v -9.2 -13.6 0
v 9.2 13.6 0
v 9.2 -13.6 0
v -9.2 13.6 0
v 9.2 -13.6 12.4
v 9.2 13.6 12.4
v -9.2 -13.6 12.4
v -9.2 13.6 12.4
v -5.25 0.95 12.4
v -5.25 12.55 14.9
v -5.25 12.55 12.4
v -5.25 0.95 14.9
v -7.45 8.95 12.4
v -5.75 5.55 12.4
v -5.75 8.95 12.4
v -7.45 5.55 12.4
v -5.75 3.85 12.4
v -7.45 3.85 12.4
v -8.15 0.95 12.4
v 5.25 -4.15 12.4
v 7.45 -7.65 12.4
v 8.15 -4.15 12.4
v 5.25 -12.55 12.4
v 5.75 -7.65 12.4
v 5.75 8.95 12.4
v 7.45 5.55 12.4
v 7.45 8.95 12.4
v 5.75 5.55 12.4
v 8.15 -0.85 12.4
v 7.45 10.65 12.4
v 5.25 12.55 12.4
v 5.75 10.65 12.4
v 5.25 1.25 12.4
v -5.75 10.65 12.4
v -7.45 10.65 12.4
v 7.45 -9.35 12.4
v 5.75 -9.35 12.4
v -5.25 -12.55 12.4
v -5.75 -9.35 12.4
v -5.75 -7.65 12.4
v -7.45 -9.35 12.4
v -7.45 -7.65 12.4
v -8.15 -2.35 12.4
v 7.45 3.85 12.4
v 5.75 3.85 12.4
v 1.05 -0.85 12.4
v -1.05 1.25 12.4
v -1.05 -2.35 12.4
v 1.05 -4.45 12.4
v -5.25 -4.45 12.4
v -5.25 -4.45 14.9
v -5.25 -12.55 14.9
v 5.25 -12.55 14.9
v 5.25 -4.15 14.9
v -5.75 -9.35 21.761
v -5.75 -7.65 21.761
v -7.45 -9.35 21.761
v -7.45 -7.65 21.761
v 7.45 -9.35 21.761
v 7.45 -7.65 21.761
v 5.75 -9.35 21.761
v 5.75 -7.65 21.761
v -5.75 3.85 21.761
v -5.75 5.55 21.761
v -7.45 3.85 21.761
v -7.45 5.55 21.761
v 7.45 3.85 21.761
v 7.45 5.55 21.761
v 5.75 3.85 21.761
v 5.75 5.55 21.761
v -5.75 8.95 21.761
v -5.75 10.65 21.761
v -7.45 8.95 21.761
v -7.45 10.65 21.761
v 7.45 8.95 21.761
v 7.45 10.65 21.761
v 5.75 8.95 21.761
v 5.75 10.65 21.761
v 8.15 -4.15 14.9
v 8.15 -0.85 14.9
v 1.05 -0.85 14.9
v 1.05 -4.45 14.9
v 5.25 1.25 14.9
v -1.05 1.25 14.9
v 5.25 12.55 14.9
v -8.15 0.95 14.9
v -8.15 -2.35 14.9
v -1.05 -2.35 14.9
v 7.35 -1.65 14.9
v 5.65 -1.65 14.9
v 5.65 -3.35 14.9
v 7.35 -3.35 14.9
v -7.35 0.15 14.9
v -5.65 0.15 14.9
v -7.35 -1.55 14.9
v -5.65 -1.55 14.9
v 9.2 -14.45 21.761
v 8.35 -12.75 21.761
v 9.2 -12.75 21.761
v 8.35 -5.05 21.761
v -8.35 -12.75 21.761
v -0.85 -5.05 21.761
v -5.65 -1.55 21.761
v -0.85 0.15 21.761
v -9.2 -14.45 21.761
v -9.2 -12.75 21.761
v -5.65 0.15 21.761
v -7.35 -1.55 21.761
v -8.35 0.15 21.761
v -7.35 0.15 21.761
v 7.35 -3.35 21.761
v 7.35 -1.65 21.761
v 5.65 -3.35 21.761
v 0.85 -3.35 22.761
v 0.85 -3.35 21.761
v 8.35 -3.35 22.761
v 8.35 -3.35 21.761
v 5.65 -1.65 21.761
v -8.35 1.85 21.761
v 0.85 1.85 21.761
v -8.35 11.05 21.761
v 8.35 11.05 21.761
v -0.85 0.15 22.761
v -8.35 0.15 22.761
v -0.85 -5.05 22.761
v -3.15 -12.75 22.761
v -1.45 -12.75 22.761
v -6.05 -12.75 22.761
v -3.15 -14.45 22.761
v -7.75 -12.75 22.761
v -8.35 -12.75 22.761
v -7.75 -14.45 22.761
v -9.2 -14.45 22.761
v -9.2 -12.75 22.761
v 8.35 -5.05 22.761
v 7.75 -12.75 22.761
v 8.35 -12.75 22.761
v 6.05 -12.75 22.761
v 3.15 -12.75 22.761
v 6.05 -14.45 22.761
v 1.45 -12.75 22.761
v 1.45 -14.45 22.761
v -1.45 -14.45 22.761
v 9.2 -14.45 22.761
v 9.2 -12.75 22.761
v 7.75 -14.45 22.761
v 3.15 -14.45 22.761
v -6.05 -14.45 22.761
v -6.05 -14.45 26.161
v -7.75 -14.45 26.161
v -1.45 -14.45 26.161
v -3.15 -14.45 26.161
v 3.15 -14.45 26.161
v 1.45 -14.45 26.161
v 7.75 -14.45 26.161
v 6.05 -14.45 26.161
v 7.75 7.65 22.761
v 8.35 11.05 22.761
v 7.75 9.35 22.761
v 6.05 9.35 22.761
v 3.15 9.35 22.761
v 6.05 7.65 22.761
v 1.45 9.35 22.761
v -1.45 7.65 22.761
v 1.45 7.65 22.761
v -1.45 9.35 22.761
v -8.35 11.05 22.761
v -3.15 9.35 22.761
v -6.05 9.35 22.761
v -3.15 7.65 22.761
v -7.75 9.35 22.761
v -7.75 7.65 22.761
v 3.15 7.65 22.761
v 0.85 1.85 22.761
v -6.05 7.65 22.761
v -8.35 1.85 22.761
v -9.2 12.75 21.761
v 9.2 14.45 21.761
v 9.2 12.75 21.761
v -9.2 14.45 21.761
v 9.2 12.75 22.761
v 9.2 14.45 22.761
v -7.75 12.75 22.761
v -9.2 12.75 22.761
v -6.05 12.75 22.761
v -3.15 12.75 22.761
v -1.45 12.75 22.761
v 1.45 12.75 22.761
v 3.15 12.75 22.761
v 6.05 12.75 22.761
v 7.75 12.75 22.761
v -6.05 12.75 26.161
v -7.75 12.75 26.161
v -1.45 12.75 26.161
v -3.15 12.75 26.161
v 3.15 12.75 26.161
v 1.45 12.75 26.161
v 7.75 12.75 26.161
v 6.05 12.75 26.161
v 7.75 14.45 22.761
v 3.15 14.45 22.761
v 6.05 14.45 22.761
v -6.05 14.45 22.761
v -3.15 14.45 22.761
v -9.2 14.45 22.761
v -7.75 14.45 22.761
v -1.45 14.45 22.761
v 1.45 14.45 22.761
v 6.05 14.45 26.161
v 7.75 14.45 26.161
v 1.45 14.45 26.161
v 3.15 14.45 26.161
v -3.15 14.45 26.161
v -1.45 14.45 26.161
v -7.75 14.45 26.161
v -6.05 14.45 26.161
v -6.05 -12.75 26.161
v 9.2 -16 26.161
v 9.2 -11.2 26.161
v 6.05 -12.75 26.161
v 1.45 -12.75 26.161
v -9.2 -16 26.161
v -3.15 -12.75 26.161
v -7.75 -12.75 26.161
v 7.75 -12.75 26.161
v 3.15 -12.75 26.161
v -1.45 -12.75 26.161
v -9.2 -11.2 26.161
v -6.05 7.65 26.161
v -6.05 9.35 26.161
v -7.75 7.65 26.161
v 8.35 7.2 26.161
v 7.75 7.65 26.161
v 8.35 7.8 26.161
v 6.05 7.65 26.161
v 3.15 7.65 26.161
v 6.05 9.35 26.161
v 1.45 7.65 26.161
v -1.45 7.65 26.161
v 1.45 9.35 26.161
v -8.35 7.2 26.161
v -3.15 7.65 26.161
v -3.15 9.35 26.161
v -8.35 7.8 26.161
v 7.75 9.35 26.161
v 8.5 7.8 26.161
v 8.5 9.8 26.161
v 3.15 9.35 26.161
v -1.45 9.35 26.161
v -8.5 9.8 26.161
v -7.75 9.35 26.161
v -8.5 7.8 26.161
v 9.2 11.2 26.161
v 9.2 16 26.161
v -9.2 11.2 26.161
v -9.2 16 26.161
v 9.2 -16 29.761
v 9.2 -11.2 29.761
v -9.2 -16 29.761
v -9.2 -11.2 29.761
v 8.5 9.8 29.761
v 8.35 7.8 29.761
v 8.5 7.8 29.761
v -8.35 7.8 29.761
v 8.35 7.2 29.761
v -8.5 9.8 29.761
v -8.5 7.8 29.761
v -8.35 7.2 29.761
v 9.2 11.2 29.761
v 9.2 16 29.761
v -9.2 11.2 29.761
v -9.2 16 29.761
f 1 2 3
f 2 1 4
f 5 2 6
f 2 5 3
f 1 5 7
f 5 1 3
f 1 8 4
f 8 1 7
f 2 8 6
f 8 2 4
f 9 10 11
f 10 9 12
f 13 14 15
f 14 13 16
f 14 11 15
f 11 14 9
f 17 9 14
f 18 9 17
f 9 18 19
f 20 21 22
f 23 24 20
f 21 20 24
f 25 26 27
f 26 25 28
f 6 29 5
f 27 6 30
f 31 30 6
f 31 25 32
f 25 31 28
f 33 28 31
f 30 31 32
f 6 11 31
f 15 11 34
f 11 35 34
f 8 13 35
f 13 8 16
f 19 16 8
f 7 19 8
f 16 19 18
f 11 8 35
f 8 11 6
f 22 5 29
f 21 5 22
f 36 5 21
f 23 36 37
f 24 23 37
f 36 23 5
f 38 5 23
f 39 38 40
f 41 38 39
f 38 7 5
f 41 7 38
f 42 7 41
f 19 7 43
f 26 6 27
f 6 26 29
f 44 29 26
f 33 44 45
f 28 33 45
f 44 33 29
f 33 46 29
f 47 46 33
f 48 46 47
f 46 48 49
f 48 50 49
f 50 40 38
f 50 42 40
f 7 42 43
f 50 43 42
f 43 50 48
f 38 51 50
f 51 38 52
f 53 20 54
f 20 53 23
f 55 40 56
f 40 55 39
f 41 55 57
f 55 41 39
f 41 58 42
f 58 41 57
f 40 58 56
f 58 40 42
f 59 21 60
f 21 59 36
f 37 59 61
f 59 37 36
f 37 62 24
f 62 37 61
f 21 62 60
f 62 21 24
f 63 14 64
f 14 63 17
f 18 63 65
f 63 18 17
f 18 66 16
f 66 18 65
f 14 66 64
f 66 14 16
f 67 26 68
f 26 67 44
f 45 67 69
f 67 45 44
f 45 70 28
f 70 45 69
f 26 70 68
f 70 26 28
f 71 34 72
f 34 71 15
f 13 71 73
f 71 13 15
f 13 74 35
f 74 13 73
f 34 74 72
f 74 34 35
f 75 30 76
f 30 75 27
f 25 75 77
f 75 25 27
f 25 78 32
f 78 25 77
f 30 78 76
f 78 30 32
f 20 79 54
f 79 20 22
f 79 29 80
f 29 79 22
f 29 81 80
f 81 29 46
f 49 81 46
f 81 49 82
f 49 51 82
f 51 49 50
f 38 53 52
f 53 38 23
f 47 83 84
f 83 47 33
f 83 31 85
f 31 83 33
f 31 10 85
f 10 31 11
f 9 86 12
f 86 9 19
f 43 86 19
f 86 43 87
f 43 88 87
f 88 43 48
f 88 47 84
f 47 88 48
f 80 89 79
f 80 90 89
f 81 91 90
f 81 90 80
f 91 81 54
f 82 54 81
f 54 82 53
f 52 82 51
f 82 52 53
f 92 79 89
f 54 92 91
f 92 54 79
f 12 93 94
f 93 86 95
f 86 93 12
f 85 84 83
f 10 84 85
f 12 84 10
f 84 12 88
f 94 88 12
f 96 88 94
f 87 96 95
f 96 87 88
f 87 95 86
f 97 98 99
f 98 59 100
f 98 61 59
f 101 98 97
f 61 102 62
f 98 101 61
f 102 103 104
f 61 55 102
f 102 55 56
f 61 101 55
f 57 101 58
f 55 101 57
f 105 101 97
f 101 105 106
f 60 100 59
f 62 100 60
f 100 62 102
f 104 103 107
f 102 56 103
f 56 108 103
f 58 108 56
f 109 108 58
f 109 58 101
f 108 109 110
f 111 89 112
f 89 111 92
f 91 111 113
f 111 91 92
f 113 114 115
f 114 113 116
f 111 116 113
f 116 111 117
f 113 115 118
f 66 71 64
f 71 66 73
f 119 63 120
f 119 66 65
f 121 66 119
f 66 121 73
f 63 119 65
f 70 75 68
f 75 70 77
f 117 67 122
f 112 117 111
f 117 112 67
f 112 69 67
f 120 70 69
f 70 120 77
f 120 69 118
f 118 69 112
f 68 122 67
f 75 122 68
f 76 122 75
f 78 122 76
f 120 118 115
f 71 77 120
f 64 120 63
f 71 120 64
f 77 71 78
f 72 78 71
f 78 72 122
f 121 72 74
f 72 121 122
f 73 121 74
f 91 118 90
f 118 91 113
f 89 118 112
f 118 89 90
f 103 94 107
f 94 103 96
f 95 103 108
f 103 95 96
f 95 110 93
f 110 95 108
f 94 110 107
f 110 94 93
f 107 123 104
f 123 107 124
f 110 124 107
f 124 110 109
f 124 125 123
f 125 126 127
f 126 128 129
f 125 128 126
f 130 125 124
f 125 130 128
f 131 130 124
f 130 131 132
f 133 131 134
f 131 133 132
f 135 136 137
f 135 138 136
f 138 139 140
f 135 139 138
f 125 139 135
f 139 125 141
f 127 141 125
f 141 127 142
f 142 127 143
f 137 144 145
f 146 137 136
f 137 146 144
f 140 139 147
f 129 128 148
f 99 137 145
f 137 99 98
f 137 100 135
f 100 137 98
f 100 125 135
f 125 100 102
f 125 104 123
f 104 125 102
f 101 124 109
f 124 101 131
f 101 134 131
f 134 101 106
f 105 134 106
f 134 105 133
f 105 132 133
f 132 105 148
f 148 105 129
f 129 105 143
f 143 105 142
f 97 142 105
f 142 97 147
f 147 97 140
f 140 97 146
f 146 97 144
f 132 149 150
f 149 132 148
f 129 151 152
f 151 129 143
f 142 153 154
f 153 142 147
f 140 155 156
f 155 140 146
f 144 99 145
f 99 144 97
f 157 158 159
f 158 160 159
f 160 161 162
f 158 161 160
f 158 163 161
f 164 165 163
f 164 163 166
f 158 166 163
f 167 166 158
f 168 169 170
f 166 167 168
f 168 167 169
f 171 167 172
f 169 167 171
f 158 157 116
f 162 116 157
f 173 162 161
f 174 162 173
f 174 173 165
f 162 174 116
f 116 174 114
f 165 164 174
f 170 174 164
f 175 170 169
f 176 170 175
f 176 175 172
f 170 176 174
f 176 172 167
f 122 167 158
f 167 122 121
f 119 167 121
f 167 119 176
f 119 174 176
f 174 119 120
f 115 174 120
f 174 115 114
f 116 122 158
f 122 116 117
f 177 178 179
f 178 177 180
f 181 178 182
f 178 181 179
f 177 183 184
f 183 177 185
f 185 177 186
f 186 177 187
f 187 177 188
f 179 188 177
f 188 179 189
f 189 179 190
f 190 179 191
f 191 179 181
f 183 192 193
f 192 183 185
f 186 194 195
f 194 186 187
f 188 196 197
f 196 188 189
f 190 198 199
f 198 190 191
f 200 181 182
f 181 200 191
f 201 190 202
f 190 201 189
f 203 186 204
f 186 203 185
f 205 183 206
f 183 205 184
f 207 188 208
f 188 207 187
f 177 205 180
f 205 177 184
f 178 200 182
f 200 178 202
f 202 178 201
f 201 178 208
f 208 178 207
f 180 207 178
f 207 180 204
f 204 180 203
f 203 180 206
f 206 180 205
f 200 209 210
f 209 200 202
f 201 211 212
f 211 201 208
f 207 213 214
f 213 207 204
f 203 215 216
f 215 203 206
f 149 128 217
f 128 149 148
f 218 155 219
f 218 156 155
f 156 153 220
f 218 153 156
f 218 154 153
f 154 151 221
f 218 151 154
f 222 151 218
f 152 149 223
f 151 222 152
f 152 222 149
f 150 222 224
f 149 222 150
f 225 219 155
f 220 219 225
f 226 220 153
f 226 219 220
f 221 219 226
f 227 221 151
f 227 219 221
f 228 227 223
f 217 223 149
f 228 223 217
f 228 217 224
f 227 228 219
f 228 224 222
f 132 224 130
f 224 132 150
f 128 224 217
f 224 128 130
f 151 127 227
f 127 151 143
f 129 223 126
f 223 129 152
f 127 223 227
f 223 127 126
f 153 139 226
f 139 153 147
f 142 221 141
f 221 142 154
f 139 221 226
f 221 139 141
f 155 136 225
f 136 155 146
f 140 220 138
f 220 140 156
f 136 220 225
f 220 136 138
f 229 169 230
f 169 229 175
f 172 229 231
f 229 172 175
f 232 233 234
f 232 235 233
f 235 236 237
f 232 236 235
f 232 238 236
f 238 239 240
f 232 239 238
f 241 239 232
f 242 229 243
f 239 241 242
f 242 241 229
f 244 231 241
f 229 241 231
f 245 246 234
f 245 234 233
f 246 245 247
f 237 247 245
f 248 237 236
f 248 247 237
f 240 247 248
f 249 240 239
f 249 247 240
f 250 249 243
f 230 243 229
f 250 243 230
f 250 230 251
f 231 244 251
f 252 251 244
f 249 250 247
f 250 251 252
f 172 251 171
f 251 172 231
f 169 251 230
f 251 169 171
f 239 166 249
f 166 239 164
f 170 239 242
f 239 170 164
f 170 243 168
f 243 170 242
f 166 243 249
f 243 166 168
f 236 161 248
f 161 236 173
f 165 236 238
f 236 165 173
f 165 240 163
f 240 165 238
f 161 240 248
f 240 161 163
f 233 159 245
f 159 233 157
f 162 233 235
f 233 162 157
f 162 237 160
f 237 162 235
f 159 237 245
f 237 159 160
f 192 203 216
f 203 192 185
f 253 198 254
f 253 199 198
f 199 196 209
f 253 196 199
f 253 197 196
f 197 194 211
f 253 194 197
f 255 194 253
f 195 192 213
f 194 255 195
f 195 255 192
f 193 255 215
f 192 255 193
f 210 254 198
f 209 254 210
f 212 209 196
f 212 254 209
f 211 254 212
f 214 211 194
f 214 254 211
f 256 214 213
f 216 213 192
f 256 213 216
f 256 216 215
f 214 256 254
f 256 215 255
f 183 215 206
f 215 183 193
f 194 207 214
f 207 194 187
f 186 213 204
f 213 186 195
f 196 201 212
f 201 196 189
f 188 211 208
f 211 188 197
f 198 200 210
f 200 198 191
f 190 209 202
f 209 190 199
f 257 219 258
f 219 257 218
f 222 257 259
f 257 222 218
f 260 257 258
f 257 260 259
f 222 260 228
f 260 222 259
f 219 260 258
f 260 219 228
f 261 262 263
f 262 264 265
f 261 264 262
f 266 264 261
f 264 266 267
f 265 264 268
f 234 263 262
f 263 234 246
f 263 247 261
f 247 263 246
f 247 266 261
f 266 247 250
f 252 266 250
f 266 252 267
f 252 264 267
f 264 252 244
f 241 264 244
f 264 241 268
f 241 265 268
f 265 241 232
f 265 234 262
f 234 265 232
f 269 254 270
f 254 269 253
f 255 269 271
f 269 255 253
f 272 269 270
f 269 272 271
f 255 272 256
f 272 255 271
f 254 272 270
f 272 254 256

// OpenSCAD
// Generated by SolidPython 0.4.2 on 2020-09-29 23:21:05
//!OpenSCAD

scale(v = 0.0100000000) {
	translate(v = [-920, -1360, 0]) {
		union() {
			color(c = [0.4000000000, 0.4000000000, 0.4000000000]) {
				translate(v = [0, 0, 0]) {
					linear_extrude(height = 1000.0000000000) {
						polygon(paths = [[0, 1, 2, 3]], points = [[0, 0], [0, 2720], [1840, 2720], [1840, 0]]);
					}
				}
			}
			color(c = [0.2000000000, 0.6000000000, 0.2000000000]) {
				translate(v = [0, 0, 1000.0000000000]) {
					linear_extrude(height = 120.0000000000) {
						polygon(paths = [[0, 1, 2, 3]], points = [[0, 1305], [0, 2720], [1840, 2720], [1840, 1305]]);
					}
				}
			}
			color(c = [0.4000000000, 0.4000000000, 0.4000000000]) {
				translate(v = [0, 0, 1000.0000000000]) {
					linear_extrude(height = 120.0000000000) {
						polygon(paths = [[0, 1, 2, 3]], points = [[0, 0], [0, 1305], [1840, 1305], [1840, 0]]);
					}
				}
			}
			color(c = [0.9000000000, 0.6000000000, 0.6000000000]) {
				translate(v = [0, 0, 1120.0000000000]) {
					linear_extrude(height = 120.0000000000) {
						polygon(paths = [[0, 1, 2, 3]], points = [[135, 1615], [135, 2485], [395, 2485], [395, 1615]]);
					}
				}
			}
			color(c = [0.9000000000, 0.6000000000, 0.6000000000]) {
				translate(v = [0, 0, 1120.0000000000]) {
					linear_extrude(height = 120.0000000000) {
						polygon(paths = [[0, 1, 2, 3]], points = [[1445, 1615], [1445, 2485], [1705, 2485], [1705, 1615]]);
					}
				}
			}
			color(c = [0.9000000000, 0.6000000000, 0.9000000000]) {
				translate(v = [0, 0, 1120.0000000000]) {
					linear_extrude(height = 120.0000000000) {
						polygon(paths = [[0, 1, 2, 3]], points = [[135, 235], [135, 785], [395, 785], [395, 235]]);
					}
				}
			}
			color(c = [0.9000000000, 0.6000000000, 0.9000000000]) {
				translate(v = [0, 0, 1120.0000000000]) {
					linear_extrude(height = 120.0000000000) {
						polygon(paths = [[0, 1, 2, 3]], points = [[1445, 235], [1445, 785], [1705, 785], [1705, 235]]);
					}
				}
			}
			color(c = [0.2000000000, 0.6000000000, 0.2000000000]) {
				translate(v = [0, 0, 1120.0000000000]) {
					linear_extrude(height = 120.0000000000) {
						difference() {
							polygon(paths = [[0, 1, 2, 3]], points = [[0, 1305], [0, 2720], [1840, 2720], [1840, 1305]]);
							polygon(paths = [[0, 1, 2, 3]], points = [[135, 1615], [395, 1615], [395, 2485], [135, 2485]]);
							polygon(paths = [[0, 1, 2, 3]], points = [[1445, 1615], [1705, 1615], [1705, 2485], [1445, 2485]]);
						}
					}
				}
			}
			color(c = [0.4000000000, 0.4000000000, 0.4000000000]) {
				translate(v = [0, 0, 1120.0000000000]) {
					linear_extrude(height = 120.0000000000) {
						difference() {
							polygon(paths = [[0, 1, 2, 3]], points = [[0, 0], [0, 1305], [1840, 1305], [1840, 0]]);
							polygon(paths = [[0, 1, 2, 3]], points = [[135, 235], [395, 235], [395, 785], [135, 785]]);
							polygon(paths = [[0, 1, 2, 3]], points = [[1445, 235], [1705, 235], [1705, 785], [1445, 785]]);
						}
					}
				}
			}
			color(c = [0.1000000000, 0.1000000000, 0.1000000000]) {
				translate(v = [0, 0, 1240.0000000000]) {
					linear_extrude(height = 70.0000000000) {
						polygon(paths = [[0, 1, 2, 3]], points = [[175, 425], [175, 595], [345, 595], [345, 425]]);
					}
				}
			}
			color(c = [0.1000000000, 0.1000000000, 0.1000000000]) {
				translate(v = [0, 0, 1240.0000000000]) {
					linear_extrude(height = 70.0000000000) {
						polygon(paths = [[0, 1, 2, 3]], points = [[1495, 425], [1495, 595], [1665, 595], [1665, 425]]);
					}
				}
			}
			color(c = [0.1000000000, 0.1000000000, 0.1000000000]) {
				translate(v = [0, 0, 1240.0000000000]) {
					linear_extrude(height = 70.0000000000) {
						polygon(paths = [[0, 1, 2, 3]], points = [[175, 1745], [175, 1915], [345, 1915], [345, 1745]]);
					}
				}
			}
			color(c = [0.1000000000, 0.1000000000, 0.1000000000]) {
				translate(v = [0, 0, 1240.0000000000]) {
					linear_extrude(height = 70.0000000000) {
						polygon(paths = [[0, 1, 2, 3]], points = [[1495, 1745], [1495, 1915], [1665, 1915], [1665, 1745]]);
					}
				}
			}
			color(c = [0.1000000000, 0.1000000000, 0.1000000000]) {
				translate(v = [0, 0, 1240.0000000000]) {
					linear_extrude(height = 70.0000000000) {
						polygon(paths = [[0, 1, 2, 3]], points = [[175, 2255], [175, 2425], [345, 2425], [345, 2255]]);
					}
				}
			}
			color(c = [0.1000000000, 0.1000000000, 0.1000000000]) {
				translate(v = [0, 0, 1240.0000000000]) {
					linear_extrude(height = 70.0000000000) {
						polygon(paths = [[0, 1, 2, 3]], points = [[1495, 2255], [1495, 2425], [1665, 2425], [1665, 2255]]);
					}
				}
			}
			color(c = [1.0000000000, 1.0000000000, 1.0000000000]) {
				translate(v = [0, 0, 1240.0000000000]) {
					linear_extrude(height = 70.0000000000) {
						polygon(paths = [[0, 1, 2, 3, 4, 5, 6, 7]], points = [[395, 105], [395, 915], [1025, 915], [1025, 1275], [1735, 1275], [1735, 945], [1445, 945], [1445, 105]]);
					}
				}
			}
			color(c = [1.0000000000, 1.0000000000, 1.0000000000]) {
				translate(v = [0, 0, 1240.0000000000]) {
					linear_extrude(height = 70.0000000000) {
						polygon(paths = [[0, 1, 2, 3, 4, 5, 6, 7]], points = [[105, 1125], [105, 1455], [395, 1455], [395, 2615], [1445, 2615], [1445, 1485], [815, 1485], [815, 1125]]);
					}
				}
			}
			color(c = [0.1000000000, 0.1000000000, 0.1000000000]) {
				translate(v = [0, 0, 1310.0000000000]) {
					linear_extrude(height = 180.0000000000) {
						polygon(paths = [[0, 1, 2, 3]], points = [[175, 425], [175, 595], [345, 595], [345, 425]]);
					}
				}
			}
			color(c = [0.1000000000, 0.1000000000, 0.1000000000]) {
				translate(v = [0, 0, 1310.0000000000]) {
					linear_extrude(height = 180.0000000000) {
						polygon(paths = [[0, 1, 2, 3]], points = [[1495, 425], [1495, 595], [1665, 595], [1665, 425]]);
					}
				}
			}
			color(c = [0.1000000000, 0.1000000000, 0.1000000000]) {
				translate(v = [0, 0, 1310.0000000000]) {
					linear_extrude(height = 180.0000000000) {
						polygon(paths = [[0, 1, 2, 3]], points = [[175, 1745], [175, 1915], [345, 1915], [345, 1745]]);
					}
				}
			}
			color(c = [0.1000000000, 0.1000000000, 0.1000000000]) {
				translate(v = [0, 0, 1310.0000000000]) {
					linear_extrude(height = 180.0000000000) {
						polygon(paths = [[0, 1, 2, 3]], points = [[1495, 1745], [1495, 1915], [1665, 1915], [1665, 1745]]);
					}
				}
			}
			color(c = [0.1000000000, 0.1000000000, 0.1000000000]) {
				translate(v = [0, 0, 1310.0000000000]) {
					linear_extrude(height = 180.0000000000) {
						polygon(paths = [[0, 1, 2, 3]], points = [[175, 2255], [175, 2425], [345, 2425], [345, 2255]]);
					}
				}
			}
			color(c = [0.1000000000, 0.1000000000, 0.1000000000]) {
				translate(v = [0, 0, 1310.0000000000]) {
					linear_extrude(height = 180.0000000000) {
						polygon(paths = [[0, 1, 2, 3]], points = [[1495, 2255], [1495, 2425], [1665, 2425], [1665, 2255]]);
					}
				}
			}
			color(c = [0.7000000000, 0, 0]) {
				translate(v = [0, 0, 1310.0000000000]) {
					linear_extrude(height = 180.0000000000) {
						polygon(paths = [[0, 1, 2, 3, 4, 5, 6, 7]], points = [[395, 105], [395, 915], [1025, 915], [1025, 1275], [1735, 1275], [1735, 945], [1445, 945], [1445, 105]]);
					}
				}
			}
			color(c = [0.7000000000, 0, 0]) {
				translate(v = [0, 0, 1310.0000000000]) {
					linear_extrude(height = 180.0000000000) {
						polygon(paths = [[0, 1, 2, 3, 4, 5, 6, 7]], points = [[105, 1125], [105, 1455], [395, 1455], [395, 2615], [1445, 2615], [1445, 1485], [815, 1485], [815, 1125]]);
					}
				}
			}
			color(c = [0.1000000000, 0.1000000000, 0.1000000000]) {
				translate(v = [0, 0, 1490.0000000000]) {
					linear_extrude(height = 686.1000000000) {
						polygon(paths = [[0, 1, 2, 3]], points = [[175, 425], [175, 595], [345, 595], [345, 425]]);
					}
				}
			}
			color(c = [0.1000000000, 0.1000000000, 0.1000000000]) {
				translate(v = [0, 0, 1490.0000000000]) {
					linear_extrude(height = 686.1000000000) {
						polygon(paths = [[0, 1, 2, 3]], points = [[1495, 425], [1495, 595], [1665, 595], [1665, 425]]);
					}
				}
			}
			color(c = [0.1000000000, 0.1000000000, 0.1000000000]) {
				translate(v = [0, 0, 1490.0000000000]) {
					linear_extrude(height = 686.1000000000) {
						polygon(paths = [[0, 1, 2, 3]], points = [[1485, 1025], [1485, 1195], [1655, 1195], [1655, 1025]]);
					}
				}
			}
			color(c = [0.1000000000, 0.1000000000, 0.1000000000]) {
				translate(v = [0, 0, 1490.0000000000]) {
					linear_extrude(height = 686.1000000000) {
						polygon(paths = [[0, 1, 2, 3]], points = [[185, 1205], [185, 1375], [355, 1375], [355, 1205]]);
					}
				}
			}
			color(c = [0.1000000000, 0.1000000000, 0.1000000000]) {
				translate(v = [0, 0, 1490.0000000000]) {
					linear_extrude(height = 686.1000000000) {
						polygon(paths = [[0, 1, 2, 3]], points = [[175, 1745], [175, 1915], [345, 1915], [345, 1745]]);
					}
				}
			}
			color(c = [0.1000000000, 0.1000000000, 0.1000000000]) {
				translate(v = [0, 0, 1490.0000000000]) {
					linear_extrude(height = 686.1000000000) {
						polygon(paths = [[0, 1, 2, 3]], points = [[1495, 1745], [1495, 1915], [1665, 1915], [1665, 1745]]);
					}
				}
			}
			color(c = [0.1000000000, 0.1000000000, 0.1000000000]) {
				translate(v = [0, 0, 1490.0000000000]) {
					linear_extrude(height = 686.1000000000) {
						polygon(paths = [[0, 1, 2, 3]], points = [[175, 2255], [175, 2425], [345, 2425], [345, 2255]]);
					}
				}
			}
			color(c = [0.1000000000, 0.1000000000, 0.1000000000]) {
				translate(v = [0, 0, 1490.0000000000]) {
					linear_extrude(height = 686.1000000000) {
						polygon(paths = [[0, 1, 2, 3]], points = [[1495, 2255], [1495, 2425], [1665, 2425], [1665, 2255]]);
					}
				}
			}
			color(c = [0.9000000000, 0.6000000000, 0.6000000000]) {
				translate(v = [0, 0, 2176.1000000000]) {
					linear_extrude(height = 100.0000000000) {
						polygon(paths = [[0, 1, 2, 3, 4, 5, 6, 7, 8, 9]], points = [[0, -85], [0, 85], [85, 85], [85, 1375], [835, 1375], [835, 855], [1755, 855], [1755, 85], [1840, 85], [1840, -85]]);
					}
				}
			}
			color(c = [0.9000000000, 0.6000000000, 0.6000000000]) {
				translate(v = [0, 0, 2176.1000000000]) {
					linear_extrude(height = 100.0000000000) {
						polygon(paths = [[0, 1, 2, 3, 4, 5]], points = [[1005, 1025], [1005, 1545], [85, 1545], [85, 2465], [1755, 2465], [1755, 1025]]);
					}
				}
			}
			color(c = [0.9000000000, 0.6000000000, 0.6000000000]) {
				translate(v = [0, 0, 2176.1000000000]) {
					linear_extrude(height = 100.0000000000) {
						polygon(paths = [[0, 1, 2, 3]], points = [[0, 2635], [0, 2805], [1840, 2805], [1840, 2635]]);
					}
				}
			}
			color(c = [0.5000000000, 0.5000000000, 0.5000000000]) {
				translate(v = [0, 0, 2276.1000000000]) {
					linear_extrude(height = 340.0000000000) {
						polygon(paths = [[0, 1, 2, 3]], points = [[145, -85], [145, 85], [315, 85], [315, -85]]);
					}
				}
			}
			color(c = [0.5000000000, 0.5000000000, 0.5000000000]) {
				translate(v = [0, 0, 2276.1000000000]) {
					linear_extrude(height = 340.0000000000) {
						polygon(paths = [[0, 1, 2, 3]], points = [[605, -85], [605, 85], [775, 85], [775, -85]]);
					}
				}
			}
			color(c = [0.5000000000, 0.5000000000, 0.5000000000]) {
				translate(v = [0, 0, 2276.1000000000]) {
					linear_extrude(height = 340.0000000000) {
						polygon(paths = [[0, 1, 2, 3]], points = [[1065, -85], [1065, 85], [1235, 85], [1235, -85]]);
					}
				}
			}
			color(c = [0.5000000000, 0.5000000000, 0.5000000000]) {
				translate(v = [0, 0, 2276.1000000000]) {
					linear_extrude(height = 340.0000000000) {
						polygon(paths = [[0, 1, 2, 3]], points = [[1525, -85], [1525, 85], [1695, 85], [1695, -85]]);
					}
				}
			}
			color(c = [0.5000000000, 0.5000000000, 0.5000000000]) {
				translate(v = [0, 0, 2276.1000000000]) {
					linear_extrude(height = 340.0000000000) {
						polygon(paths = [[0, 1, 2, 3]], points = [[145, 2125], [145, 2295], [315, 2295], [315, 2125]]);
					}
				}
			}
			color(c = [0.5000000000, 0.5000000000, 0.5000000000]) {
				translate(v = [0, 0, 2276.1000000000]) {
					linear_extrude(height = 340.0000000000) {
						polygon(paths = [[0, 1, 2, 3]], points = [[605, 2125], [605, 2295], [775, 2295], [775, 2125]]);
					}
				}
			}
			color(c = [0.5000000000, 0.5000000000, 0.5000000000]) {
				translate(v = [0, 0, 2276.1000000000]) {
					linear_extrude(height = 340.0000000000) {
						polygon(paths = [[0, 1, 2, 3]], points = [[1065, 2125], [1065, 2295], [1235, 2295], [1235, 2125]]);
					}
				}
			}
			color(c = [0.5000000000, 0.5000000000, 0.5000000000]) {
				translate(v = [0, 0, 2276.1000000000]) {
					linear_extrude(height = 340.0000000000) {
						polygon(paths = [[0, 1, 2, 3]], points = [[1525, 2125], [1525, 2295], [1695, 2295], [1695, 2125]]);
					}
				}
			}
			color(c = [0.5000000000, 0.5000000000, 0.5000000000]) {
				translate(v = [0, 0, 2276.1000000000]) {
					linear_extrude(height = 340.0000000000) {
						polygon(paths = [[0, 1, 2, 3]], points = [[145, 2635], [145, 2805], [315, 2805], [315, 2635]]);
					}
				}
			}
			color(c = [0.5000000000, 0.5000000000, 0.5000000000]) {
				translate(v = [0, 0, 2276.1000000000]) {
					linear_extrude(height = 340.0000000000) {
						polygon(paths = [[0, 1, 2, 3]], points = [[605, 2635], [605, 2805], [775, 2805], [775, 2635]]);
					}
				}
			}
			color(c = [0.5000000000, 0.5000000000, 0.5000000000]) {
				translate(v = [0, 0, 2276.1000000000]) {
					linear_extrude(height = 340.0000000000) {
						polygon(paths = [[0, 1, 2, 3]], points = [[1065, 2635], [1065, 2805], [1235, 2805], [1235, 2635]]);
					}
				}
			}
			color(c = [0.5000000000, 0.5000000000, 0.5000000000]) {
				translate(v = [0, 0, 2276.1000000000]) {
					linear_extrude(height = 340.0000000000) {
						polygon(paths = [[0, 1, 2, 3]], points = [[1525, 2635], [1525, 2805], [1695, 2805], [1695, 2635]]);
					}
				}
			}
			color(c = [0.3000000000, 0.3000000000, 1]) {
				translate(v = [0, 0, 2616.1000000000]) {
					linear_extrude(height = 360.0000000000) {
						polygon(paths = [[0, 1, 2, 3]], points = [[0, -240], [0, 240], [1840, 240], [1840, -240]]);
					}
				}
			}
			color(c = [0.3000000000, 0.3000000000, 1]) {
				translate(v = [0, 0, 2616.1000000000]) {
					linear_extrude(height = 360.0000000000) {
						polygon(paths = [[0, 1, 2, 3, 4, 5, 6, 7]], points = [[85, 2080], [85, 2140], [70, 2140], [70, 2340], [1770, 2340], [1770, 2140], [1755, 2140], [1755, 2080]]);
					}
				}
			}
			color(c = [0.3000000000, 0.3000000000, 1]) {
				translate(v = [0, 0, 2616.1000000000]) {
					linear_extrude(height = 360.0000000000) {
						polygon(paths = [[0, 1, 2, 3]], points = [[0, 2480], [0, 2960], [1840, 2960], [1840, 2480]]);
					}
				}
			}
		}
	}
}
